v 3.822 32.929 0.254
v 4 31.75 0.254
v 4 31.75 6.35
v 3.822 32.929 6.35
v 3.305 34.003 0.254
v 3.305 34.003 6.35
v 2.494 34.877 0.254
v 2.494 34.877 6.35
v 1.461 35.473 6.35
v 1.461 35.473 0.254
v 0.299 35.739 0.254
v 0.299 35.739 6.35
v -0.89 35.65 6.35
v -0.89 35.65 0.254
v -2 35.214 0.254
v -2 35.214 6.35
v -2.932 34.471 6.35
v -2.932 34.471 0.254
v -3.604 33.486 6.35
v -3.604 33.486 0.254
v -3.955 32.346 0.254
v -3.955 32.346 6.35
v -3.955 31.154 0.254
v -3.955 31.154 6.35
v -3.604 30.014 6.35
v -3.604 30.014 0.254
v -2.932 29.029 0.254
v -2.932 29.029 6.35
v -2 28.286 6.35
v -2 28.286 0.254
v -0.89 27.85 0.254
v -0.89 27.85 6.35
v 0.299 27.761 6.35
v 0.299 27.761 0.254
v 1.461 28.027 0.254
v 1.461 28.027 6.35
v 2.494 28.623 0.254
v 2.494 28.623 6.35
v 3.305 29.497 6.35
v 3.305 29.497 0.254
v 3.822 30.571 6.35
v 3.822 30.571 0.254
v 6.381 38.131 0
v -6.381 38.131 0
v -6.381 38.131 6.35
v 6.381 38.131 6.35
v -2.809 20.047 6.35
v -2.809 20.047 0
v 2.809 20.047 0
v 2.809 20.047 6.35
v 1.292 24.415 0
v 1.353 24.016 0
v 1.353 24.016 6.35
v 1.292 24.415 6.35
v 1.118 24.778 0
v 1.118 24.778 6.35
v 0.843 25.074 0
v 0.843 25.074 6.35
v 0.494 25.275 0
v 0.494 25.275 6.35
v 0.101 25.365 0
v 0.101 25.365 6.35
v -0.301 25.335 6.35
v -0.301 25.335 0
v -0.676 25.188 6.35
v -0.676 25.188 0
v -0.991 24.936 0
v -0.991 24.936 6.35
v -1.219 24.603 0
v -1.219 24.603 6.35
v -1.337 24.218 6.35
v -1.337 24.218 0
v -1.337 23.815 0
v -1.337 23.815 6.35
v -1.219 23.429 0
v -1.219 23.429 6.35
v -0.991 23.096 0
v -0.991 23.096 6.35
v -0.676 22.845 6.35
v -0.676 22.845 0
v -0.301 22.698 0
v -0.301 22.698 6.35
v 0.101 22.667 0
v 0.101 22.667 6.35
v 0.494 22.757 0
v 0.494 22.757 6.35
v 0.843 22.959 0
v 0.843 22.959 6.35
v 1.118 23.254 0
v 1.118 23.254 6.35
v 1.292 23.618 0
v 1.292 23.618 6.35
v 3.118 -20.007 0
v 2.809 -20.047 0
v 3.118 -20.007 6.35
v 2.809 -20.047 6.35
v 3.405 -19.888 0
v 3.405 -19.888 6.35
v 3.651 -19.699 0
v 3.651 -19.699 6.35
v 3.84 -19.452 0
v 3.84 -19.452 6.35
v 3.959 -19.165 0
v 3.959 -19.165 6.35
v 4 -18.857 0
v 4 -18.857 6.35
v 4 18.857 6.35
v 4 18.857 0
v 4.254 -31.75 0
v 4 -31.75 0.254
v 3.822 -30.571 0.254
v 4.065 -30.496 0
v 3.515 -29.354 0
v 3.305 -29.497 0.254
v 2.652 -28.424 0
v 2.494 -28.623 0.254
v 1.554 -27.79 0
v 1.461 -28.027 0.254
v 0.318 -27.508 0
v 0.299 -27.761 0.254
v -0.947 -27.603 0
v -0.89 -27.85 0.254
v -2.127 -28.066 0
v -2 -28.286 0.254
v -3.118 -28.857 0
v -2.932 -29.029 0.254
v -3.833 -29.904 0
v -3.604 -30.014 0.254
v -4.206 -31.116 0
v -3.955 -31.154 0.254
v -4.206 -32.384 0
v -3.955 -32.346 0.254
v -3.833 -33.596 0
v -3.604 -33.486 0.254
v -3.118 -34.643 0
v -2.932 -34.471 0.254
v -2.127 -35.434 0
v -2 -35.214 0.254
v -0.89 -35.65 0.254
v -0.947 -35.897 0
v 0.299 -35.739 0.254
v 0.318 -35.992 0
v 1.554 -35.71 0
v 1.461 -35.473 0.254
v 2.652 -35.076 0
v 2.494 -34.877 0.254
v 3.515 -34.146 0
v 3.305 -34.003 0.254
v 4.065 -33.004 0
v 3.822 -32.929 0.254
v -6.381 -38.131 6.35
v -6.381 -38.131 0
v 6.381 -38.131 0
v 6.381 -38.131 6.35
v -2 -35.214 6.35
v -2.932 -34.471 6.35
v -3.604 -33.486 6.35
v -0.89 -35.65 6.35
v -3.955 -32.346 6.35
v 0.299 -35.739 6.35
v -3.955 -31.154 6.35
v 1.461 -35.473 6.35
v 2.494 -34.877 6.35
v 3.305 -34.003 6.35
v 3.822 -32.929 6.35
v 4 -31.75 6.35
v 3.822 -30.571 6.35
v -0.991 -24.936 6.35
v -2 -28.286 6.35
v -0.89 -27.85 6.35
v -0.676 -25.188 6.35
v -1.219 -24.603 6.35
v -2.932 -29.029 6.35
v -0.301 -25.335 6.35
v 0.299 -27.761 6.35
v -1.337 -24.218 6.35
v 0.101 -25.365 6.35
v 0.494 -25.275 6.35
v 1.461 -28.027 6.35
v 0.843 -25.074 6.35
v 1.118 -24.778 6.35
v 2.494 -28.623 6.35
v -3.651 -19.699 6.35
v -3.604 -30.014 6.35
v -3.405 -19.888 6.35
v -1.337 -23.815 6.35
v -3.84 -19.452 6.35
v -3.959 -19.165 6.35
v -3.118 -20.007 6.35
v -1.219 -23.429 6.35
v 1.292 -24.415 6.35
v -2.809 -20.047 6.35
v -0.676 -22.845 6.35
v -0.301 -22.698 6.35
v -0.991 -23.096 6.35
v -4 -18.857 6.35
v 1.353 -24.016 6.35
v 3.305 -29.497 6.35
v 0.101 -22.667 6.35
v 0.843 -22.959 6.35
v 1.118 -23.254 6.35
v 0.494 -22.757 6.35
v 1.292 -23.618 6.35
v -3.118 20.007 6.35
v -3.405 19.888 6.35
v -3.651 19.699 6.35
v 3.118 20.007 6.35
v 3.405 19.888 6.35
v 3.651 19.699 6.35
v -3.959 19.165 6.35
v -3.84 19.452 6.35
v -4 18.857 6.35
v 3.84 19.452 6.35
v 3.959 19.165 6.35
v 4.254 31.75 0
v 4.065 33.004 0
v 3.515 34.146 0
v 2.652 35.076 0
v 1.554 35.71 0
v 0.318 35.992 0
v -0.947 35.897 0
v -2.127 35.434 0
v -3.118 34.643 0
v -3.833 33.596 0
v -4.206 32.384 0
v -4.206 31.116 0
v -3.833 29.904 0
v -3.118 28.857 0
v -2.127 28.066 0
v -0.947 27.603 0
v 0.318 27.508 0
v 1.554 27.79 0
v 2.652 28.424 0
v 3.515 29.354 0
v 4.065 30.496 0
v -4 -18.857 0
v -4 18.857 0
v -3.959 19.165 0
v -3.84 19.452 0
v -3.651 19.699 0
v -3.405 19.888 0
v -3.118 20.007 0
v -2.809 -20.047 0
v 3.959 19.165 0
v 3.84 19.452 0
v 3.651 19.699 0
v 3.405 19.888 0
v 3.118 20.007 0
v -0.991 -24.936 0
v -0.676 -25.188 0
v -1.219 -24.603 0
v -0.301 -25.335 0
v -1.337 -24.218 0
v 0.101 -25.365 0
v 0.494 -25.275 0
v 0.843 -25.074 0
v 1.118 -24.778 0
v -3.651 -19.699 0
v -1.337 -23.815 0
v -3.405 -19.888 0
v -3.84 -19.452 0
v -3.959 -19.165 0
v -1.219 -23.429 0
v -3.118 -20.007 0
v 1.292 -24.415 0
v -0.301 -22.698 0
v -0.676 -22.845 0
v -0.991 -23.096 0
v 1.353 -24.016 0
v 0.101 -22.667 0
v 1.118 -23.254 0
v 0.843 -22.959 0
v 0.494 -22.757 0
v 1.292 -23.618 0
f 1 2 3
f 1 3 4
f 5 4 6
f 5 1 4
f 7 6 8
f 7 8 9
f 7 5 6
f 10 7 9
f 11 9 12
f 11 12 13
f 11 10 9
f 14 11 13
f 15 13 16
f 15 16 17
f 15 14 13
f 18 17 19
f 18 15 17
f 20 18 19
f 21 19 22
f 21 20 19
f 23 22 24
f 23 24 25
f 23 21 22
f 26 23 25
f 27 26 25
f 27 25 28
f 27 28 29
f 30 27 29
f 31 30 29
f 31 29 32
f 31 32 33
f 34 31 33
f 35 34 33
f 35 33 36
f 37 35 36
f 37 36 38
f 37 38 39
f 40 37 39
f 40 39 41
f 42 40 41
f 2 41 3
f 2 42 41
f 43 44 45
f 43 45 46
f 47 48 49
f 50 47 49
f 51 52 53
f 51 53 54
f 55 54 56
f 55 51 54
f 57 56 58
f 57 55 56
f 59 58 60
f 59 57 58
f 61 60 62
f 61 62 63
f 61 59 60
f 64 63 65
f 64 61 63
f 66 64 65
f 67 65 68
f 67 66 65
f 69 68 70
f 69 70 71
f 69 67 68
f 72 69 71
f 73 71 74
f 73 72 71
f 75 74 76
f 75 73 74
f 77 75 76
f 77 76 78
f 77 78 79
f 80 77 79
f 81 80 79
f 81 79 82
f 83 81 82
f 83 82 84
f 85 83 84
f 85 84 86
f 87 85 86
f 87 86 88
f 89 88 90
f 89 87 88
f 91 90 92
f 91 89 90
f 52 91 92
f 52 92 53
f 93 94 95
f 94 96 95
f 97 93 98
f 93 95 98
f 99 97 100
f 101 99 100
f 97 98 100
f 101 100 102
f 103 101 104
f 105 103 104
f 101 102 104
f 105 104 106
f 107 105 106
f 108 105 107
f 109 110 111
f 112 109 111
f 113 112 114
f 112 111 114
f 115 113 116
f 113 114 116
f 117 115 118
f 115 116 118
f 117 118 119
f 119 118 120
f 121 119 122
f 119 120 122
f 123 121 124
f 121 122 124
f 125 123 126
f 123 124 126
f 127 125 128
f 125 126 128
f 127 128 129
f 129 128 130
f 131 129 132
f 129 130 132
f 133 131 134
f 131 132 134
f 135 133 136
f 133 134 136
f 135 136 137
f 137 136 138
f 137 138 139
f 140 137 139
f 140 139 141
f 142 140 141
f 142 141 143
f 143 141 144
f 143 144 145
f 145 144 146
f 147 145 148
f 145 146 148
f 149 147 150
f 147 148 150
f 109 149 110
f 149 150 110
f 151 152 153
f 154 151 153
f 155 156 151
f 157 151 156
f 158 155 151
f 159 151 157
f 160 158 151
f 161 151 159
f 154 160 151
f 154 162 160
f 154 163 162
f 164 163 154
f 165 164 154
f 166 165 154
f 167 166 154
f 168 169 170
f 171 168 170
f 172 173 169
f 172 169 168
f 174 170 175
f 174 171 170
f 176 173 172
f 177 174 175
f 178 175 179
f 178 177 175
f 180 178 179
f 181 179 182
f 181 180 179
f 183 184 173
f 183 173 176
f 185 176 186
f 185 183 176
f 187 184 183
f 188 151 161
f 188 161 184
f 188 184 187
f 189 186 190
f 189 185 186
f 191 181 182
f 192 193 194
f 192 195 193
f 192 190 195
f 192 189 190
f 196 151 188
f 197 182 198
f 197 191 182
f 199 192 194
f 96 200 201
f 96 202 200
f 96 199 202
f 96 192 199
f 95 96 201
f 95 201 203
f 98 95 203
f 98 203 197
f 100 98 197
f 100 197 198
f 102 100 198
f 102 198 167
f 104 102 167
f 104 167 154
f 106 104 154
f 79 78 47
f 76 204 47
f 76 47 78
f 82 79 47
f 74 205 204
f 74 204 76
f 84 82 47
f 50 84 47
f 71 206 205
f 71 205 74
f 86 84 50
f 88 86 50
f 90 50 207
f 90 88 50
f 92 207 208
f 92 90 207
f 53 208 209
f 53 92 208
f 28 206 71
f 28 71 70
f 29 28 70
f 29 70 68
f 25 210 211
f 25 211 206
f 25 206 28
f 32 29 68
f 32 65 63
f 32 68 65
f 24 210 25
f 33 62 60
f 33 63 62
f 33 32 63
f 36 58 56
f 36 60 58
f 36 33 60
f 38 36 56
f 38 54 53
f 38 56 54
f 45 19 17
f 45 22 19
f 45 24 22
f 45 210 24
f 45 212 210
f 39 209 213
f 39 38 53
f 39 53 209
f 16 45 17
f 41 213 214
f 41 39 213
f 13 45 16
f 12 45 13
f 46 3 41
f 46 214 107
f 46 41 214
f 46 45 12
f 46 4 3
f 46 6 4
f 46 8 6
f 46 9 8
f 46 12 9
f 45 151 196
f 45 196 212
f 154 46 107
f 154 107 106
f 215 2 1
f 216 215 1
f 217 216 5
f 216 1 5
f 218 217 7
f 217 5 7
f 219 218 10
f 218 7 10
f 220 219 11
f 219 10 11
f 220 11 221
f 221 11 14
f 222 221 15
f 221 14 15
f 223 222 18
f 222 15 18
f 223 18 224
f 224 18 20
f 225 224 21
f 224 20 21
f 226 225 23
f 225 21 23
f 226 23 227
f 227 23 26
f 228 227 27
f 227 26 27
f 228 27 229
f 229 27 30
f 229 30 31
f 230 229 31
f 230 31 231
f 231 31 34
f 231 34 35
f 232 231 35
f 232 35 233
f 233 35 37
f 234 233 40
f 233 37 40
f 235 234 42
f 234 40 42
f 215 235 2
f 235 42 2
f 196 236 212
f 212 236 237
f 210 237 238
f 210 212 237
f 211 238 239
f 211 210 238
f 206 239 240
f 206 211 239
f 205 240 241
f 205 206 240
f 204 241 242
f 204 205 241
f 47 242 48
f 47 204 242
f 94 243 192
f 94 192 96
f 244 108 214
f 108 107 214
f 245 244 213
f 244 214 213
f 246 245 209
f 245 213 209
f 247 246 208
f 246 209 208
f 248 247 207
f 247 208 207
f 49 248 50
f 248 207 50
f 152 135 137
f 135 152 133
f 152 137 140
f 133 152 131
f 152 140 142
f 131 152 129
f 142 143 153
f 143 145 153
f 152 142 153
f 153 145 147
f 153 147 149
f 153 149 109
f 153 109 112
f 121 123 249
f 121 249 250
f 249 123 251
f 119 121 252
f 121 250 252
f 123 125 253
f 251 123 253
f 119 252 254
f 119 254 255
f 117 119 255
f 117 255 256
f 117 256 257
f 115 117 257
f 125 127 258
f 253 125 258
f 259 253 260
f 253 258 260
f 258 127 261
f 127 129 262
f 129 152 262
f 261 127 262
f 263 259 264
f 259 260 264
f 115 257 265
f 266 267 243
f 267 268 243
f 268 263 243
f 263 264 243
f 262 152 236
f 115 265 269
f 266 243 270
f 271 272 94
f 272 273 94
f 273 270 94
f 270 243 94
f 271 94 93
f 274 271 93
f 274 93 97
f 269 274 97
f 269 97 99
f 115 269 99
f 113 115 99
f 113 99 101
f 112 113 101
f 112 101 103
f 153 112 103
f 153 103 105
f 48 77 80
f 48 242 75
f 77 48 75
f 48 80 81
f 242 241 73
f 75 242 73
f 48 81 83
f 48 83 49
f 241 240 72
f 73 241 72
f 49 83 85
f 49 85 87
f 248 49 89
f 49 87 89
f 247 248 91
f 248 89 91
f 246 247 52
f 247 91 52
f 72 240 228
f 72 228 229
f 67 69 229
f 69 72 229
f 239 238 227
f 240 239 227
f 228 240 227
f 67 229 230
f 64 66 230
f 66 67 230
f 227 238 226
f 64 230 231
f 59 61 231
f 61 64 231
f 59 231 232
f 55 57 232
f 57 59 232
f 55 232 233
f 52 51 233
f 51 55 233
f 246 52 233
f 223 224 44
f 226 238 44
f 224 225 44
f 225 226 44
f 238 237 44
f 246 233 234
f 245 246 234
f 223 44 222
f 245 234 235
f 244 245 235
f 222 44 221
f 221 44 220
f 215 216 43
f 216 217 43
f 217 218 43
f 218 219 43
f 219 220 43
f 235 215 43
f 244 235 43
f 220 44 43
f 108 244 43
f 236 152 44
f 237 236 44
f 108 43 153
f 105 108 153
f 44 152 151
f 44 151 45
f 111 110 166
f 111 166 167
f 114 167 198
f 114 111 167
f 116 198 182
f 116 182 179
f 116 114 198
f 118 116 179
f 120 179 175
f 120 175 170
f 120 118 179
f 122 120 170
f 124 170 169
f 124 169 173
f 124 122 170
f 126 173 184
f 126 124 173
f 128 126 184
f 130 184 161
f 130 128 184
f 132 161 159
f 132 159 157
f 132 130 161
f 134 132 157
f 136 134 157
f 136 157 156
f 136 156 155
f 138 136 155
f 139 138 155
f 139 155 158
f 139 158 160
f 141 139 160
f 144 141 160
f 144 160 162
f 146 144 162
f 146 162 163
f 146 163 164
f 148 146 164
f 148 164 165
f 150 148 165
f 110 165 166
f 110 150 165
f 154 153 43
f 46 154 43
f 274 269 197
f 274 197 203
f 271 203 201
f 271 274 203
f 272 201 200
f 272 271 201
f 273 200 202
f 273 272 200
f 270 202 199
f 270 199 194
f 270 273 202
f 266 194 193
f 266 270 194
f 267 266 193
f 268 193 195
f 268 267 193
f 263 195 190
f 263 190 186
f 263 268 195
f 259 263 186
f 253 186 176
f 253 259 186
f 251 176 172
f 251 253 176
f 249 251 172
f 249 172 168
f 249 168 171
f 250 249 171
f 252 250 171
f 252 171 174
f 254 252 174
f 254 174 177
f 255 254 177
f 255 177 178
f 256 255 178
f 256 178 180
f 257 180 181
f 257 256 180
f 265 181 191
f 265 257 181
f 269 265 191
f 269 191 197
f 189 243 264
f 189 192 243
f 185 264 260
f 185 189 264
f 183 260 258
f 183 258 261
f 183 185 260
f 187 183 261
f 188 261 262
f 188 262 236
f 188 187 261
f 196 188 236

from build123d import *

# Parameters (mm, degrees)
F0_W     = 12.7625
F0_H     = 76.2625
F0_R     = 4
F0_R_2   = 1.35255
F0_W_2   = 8
F0_H_2   = 40.0949
F1_DEPTH = 6.35
F2_R     = 1.190625
F3_SIZE  = 0.254


with BuildPart() as f1:
    # F0 (on Top) → F1 (new body)
    with BuildSketch(Plane.XY):
        Rectangle(F0_W, F0_H)
        with Locations((0, -31.75)):
            Circle(F0_R, mode=Mode.SUBTRACT)
        with Locations((0, -24.0162)):
            Circle(F0_R_2, mode=Mode.SUBTRACT)
        Rectangle(F0_W_2, F0_H_2, mode=Mode.SUBTRACT)
        with Locations((0, 24.0162)):
            Circle(F0_R_2, mode=Mode.SUBTRACT)
        with Locations((0, 31.75)):
            Circle(F0_R, mode=Mode.SUBTRACT)
    extrude(amount=F1_DEPTH)

    # F2
    f2_edges = [f1.edges().sort_by_distance(p)[0] for p in [
        (-4, 20.04745, 3.175),
        (4, 20.04745, 3.175),
        (4, -20.04745, 3.175),
        (-4, -20.04745, 3.175),
    ]]
    fillet(f2_edges, radius=F2_R)

    # F3
    f3_edges = [f1.edges().sort_by_distance(p)[0] for p in [
        (-4, 31.75, 0),
        (-4, -31.75, 0),
    ]]
    chamfer(f3_edges, length=F3_SIZE)


solid = f1.part
